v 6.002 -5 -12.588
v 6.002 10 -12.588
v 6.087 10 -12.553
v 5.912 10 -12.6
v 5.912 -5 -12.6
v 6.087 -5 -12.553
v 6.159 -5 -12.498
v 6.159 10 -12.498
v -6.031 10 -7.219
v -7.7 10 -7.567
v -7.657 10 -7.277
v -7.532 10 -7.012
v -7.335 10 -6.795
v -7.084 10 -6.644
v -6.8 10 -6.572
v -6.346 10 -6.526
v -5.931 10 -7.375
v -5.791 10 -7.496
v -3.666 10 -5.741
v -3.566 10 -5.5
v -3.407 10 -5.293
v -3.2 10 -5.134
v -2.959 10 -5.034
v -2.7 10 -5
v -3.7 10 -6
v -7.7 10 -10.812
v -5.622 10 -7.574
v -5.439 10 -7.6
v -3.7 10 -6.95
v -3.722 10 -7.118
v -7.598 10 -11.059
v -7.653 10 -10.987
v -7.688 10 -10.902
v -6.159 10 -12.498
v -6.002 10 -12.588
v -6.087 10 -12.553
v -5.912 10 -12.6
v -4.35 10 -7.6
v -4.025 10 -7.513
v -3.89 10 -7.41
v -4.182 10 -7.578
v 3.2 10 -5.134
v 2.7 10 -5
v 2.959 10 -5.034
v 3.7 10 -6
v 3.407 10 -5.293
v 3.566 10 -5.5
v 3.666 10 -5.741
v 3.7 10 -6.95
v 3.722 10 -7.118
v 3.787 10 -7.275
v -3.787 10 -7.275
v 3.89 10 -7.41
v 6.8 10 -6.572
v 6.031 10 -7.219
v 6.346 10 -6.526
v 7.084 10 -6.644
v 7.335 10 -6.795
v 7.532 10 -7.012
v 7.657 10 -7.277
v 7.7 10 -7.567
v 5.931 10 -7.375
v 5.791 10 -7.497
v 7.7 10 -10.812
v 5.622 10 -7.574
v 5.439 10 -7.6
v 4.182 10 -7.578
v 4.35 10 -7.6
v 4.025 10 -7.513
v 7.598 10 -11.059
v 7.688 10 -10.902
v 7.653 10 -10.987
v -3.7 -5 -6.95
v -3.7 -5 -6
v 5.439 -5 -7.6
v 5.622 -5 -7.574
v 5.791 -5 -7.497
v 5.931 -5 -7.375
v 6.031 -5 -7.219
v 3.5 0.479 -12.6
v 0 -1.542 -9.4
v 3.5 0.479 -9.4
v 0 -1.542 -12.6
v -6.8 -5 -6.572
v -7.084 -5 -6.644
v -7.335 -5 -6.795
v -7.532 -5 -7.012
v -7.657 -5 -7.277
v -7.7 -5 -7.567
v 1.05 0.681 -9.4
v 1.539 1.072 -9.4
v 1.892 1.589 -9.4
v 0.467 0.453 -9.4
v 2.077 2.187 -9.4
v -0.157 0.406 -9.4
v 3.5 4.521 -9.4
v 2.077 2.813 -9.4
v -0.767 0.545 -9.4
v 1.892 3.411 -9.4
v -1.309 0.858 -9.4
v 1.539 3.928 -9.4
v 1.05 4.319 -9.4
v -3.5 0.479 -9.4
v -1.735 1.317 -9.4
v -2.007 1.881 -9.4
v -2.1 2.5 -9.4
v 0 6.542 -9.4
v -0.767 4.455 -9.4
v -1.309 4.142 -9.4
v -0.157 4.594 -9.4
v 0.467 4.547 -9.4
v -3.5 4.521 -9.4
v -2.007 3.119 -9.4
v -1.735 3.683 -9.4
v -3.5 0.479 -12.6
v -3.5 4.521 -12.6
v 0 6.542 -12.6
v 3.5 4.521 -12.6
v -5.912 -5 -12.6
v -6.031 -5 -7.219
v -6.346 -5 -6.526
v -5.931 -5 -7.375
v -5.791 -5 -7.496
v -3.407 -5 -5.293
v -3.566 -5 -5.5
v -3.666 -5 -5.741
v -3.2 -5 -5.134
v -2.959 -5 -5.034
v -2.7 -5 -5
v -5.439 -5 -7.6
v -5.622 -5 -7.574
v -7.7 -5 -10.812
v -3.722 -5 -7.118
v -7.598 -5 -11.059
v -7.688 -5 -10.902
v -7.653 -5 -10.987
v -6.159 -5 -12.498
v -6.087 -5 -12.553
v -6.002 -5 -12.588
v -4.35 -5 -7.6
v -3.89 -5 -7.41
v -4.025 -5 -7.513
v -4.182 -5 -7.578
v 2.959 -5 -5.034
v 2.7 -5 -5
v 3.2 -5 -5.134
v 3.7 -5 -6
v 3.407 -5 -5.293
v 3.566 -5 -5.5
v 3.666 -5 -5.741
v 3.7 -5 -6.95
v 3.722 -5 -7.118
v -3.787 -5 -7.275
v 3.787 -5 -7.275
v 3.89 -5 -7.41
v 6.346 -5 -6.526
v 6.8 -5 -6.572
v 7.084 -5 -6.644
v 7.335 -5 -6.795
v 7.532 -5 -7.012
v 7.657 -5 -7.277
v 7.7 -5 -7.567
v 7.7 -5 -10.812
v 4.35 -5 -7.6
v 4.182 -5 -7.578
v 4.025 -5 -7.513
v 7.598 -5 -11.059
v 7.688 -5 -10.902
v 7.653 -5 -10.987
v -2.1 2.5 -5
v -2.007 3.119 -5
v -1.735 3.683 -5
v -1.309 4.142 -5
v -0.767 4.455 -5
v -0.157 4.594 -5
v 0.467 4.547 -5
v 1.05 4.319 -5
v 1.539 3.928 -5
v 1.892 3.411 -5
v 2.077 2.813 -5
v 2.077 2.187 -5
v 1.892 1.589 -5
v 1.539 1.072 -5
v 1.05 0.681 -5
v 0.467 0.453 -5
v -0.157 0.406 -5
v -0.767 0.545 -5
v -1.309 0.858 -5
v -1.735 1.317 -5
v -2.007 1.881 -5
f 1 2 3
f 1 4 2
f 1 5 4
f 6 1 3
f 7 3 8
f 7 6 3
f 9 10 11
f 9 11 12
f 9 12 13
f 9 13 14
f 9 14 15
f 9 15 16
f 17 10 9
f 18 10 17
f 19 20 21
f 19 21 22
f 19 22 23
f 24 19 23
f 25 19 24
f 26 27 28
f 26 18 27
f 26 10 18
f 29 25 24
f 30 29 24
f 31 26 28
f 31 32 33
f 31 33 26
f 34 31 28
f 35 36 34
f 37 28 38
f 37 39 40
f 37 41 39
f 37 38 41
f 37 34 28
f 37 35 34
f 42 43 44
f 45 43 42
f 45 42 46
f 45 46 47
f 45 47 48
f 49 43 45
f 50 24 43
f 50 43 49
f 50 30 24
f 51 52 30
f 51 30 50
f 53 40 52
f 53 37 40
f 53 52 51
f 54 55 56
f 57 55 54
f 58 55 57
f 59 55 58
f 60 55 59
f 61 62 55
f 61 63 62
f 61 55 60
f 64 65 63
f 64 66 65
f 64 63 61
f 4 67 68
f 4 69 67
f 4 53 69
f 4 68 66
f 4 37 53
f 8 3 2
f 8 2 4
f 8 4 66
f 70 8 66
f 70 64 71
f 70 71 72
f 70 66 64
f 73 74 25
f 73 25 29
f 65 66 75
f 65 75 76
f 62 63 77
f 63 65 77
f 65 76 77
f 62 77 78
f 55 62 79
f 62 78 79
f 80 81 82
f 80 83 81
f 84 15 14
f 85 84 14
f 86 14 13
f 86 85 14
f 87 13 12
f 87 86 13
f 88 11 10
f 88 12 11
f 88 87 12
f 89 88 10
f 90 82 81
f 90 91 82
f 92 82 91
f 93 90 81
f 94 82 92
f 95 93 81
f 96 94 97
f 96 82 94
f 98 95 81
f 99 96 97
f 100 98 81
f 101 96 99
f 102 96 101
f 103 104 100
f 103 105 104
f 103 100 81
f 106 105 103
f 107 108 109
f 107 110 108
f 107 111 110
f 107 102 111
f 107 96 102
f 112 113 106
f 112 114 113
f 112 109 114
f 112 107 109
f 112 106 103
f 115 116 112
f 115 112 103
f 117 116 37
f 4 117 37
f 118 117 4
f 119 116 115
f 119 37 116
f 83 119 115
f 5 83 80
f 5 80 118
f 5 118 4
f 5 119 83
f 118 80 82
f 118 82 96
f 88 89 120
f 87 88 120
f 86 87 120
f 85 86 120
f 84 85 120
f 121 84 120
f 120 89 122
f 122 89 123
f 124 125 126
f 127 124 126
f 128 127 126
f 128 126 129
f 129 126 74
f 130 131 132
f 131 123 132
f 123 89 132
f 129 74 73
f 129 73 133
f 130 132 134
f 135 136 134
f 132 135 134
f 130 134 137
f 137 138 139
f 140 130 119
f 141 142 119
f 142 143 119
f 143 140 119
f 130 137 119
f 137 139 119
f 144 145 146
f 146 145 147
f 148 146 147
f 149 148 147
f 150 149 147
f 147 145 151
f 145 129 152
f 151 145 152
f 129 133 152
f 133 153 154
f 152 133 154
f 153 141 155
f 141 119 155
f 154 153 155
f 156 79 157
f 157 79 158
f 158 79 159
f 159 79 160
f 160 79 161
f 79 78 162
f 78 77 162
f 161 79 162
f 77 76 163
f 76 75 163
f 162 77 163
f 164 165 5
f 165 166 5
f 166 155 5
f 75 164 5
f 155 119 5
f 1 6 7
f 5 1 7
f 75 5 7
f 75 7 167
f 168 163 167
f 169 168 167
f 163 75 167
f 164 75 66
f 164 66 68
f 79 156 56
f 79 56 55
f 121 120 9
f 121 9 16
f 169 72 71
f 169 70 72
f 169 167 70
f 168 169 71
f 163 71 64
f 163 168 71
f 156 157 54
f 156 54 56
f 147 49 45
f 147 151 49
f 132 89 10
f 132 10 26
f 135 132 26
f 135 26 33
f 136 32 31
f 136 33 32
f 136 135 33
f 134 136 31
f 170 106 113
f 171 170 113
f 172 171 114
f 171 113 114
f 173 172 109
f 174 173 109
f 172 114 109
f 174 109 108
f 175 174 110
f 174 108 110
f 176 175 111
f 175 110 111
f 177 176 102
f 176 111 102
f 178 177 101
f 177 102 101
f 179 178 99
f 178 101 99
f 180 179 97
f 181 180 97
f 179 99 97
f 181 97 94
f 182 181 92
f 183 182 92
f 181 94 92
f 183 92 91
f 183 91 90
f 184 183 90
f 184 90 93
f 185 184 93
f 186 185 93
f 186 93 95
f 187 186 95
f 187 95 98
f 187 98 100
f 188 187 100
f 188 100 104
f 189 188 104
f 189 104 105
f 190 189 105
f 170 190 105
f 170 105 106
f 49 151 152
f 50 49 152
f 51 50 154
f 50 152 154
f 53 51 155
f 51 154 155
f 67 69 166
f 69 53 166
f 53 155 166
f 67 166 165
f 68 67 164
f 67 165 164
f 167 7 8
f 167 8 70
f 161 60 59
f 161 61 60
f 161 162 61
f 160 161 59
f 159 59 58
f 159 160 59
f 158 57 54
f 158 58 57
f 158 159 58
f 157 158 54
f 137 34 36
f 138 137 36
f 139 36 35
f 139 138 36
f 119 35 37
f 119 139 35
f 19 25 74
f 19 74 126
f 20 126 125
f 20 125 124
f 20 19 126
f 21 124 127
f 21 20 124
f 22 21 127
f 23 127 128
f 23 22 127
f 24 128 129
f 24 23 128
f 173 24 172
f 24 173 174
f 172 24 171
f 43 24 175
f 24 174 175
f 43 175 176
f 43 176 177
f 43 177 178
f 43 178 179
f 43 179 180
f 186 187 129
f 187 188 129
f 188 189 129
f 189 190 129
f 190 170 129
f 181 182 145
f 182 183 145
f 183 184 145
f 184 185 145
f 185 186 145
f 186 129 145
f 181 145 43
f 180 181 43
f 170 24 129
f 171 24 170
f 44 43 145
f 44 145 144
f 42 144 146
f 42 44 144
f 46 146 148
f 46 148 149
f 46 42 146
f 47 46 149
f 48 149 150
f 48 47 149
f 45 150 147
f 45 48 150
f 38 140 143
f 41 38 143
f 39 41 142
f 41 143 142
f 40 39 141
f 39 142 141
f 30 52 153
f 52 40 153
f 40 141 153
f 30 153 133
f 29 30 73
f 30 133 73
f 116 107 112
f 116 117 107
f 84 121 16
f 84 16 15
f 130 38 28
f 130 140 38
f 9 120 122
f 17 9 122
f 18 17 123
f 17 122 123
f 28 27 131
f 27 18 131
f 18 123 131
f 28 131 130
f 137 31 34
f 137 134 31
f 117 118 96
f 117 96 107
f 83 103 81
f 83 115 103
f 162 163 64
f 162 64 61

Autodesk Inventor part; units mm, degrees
ref_plane "XY Plane" through (0, 0, 0) normal (0, 0, 1) x (1, 0, 0)
sketch "Эскиз1" plane through (0, 0, 0) normal (0, 1, 0) x (-1, 0, 0)
  line L0 (5.5, 5) -> (-5.5, 5)
  line L1 (-5.5, 5) -> (-5.5, -5)
  line L2 (-5.5, -5) -> (5.5, -5)
  line L3 (5.5, -5) -> (5.5, 5)
  line L4 (5.5, 5) -> (-5.5, -5) construction
  line L5 (-5.5, 5) -> (5.5, -5) construction
  point P0 (0, 0)
  dimension "d0" = 11
  dimension "d1" = 10
ref_plane "РабПлоскость1" through (0, 2.5, 0) normal (0, 1, 0) x (1, 0, 0)
sketch "Эскиз3" plane through (0, 2.5, 0) normal (0, 1, 0) x (1, 0, 0)
  arc A0 (-5.15, 5) -> (-4.9, 5.25) centre (-5.15, 5.25) ccw projected
  line L0 (-4.9, 5.8) -> (-4.9, 5.25) projected
  line L1 (-4.35, 5.8) -> (-4.9, 5.8) projected
  arc A1 (-4.35, 5.8) -> (-4.1, 6.05) centre (-4.35, 6.05) ccw projected
  line L2 (-4.1, 6.95) -> (-4.1, 6.05) projected
  arc A2 (-4.1, 6.95) -> (-4.35, 7.2) centre (-4.35, 6.95) ccw projected
  line L3 (-5.439, 7.2) -> (-4.35, 7.2) projected
  arc A3 (-5.439, 7.2) -> (-5.6666, 7.0535) centre (-5.439, 6.95) ccw projected
  line L4 (-6.0258, 6.2631) -> (-5.6666, 7.0535) projected
  arc A4 (-6.2783, 6.1178) -> (-6.0258, 6.2631) centre (-6.2534, 6.3666) ccw projected
  line L5 (-7.8749, 6.2775) -> (-6.2783, 6.1178) projected
  arc A5 (-8.1, 6.5262) -> (-7.8749, 6.2775) centre (-7.85, 6.5262) ccw projected
  line L6 (-8.1, 10.8115) -> (-8.1, 6.5262) projected
  arc A6 (-7.8803, 11.3419) -> (-8.1, 10.8115) centre (-7.35, 10.8115) ccw projected
  arc A7 (8.1, 10.8115) -> (7.8803, 11.3419) centre (7.35, 10.8115) ccw projected
  line L7 (8.1, 6.5262) -> (8.1, 10.8115) projected
  arc A8 (7.8749, 6.2775) -> (8.1, 6.5262) centre (7.85, 6.5262) ccw projected
  line L8 (6.2783, 6.1178) -> (7.8749, 6.2775) projected
  arc A9 (6.0258, 6.2631) -> (6.2783, 6.1178) centre (6.2534, 6.3666) ccw projected
  line L9 (5.6666, 7.0535) -> (6.0258, 6.2631) projected
  arc A10 (5.6666, 7.0535) -> (5.439, 7.2) centre (5.439, 6.95) ccw projected
  line L10 (4.35, 7.2) -> (5.439, 7.2) projected
  arc A11 (4.35, 7.2) -> (4.1, 6.95) centre (4.35, 6.95) ccw projected
  line L11 (4.1, 6.05) -> (4.1, 6.95) projected
  arc A12 (4.1, 6.05) -> (4.35, 5.8) centre (4.35, 6.05) ccw projected
  line L12 (4.9, 5.8) -> (4.35, 5.8) projected
  line L13 (4.9, 5.25) -> (4.9, 5.8) projected
  arc A13 (4.9, 5.25) -> (5.15, 5) centre (5.15, 5.25) ccw projected
  line L14 (7.8803, 11.3419) -> (6.4419, 12.7803) projected
  arc A14 (6.4419, 12.7803) -> (5.9115, 13) centre (5.9115, 12.25) ccw projected
  line L15 (5.9115, 13) -> (0.4906, 13) projected
  line L16 (-0.4906, 13) -> (-5.9115, 13) projected
  arc A15 (-5.9115, 13) -> (-6.4419, 12.7803) centre (-5.9115, 12.25) ccw projected
  line L17 (-6.4419, 12.7803) -> (-7.8803, 11.3419) projected
  line L18 (0.4906, 13) -> (-0.4906, 13)
  line L19 (-3.7, 6.05) -> (-3.7, 6.95)
  arc A16 (-3.7, 6.95) -> (-4.35, 7.6) centre (-4.35, 6.95) ccw
  line L20 (-4.35, 7.6) -> (-5.439, 7.6)
  arc A17 (-5.439, 7.6) -> (-6.0308, 7.219) centre (-5.439, 6.95) ccw
  line L21 (-6.0308, 7.219) -> (-6.3455, 6.5265)
  line L22 (-6.3455, 6.5265) -> (-7.7, 6.662)
  line L23 (-7.7, 6.662) -> (-7.7, 10.8115)
  arc A18 (-7.5975, 11.059) -> (-7.7, 10.8115) centre (-7.35, 10.8115) ccw
  line L24 (-7.5975, 11.059) -> (-6.159, 12.4975)
  arc A19 (-5.9115, 12.6) -> (-6.159, 12.4975) centre (-5.9115, 12.25) ccw
  line L25 (-5.9115, 12.6) -> (-0.4906, 12.6)
  line L26 (-0.4906, 12.6) -> (0.4906, 12.6)
  line L27 (0.4906, 12.6) -> (5.9115, 12.6)
  arc A20 (6.159, 12.4975) -> (5.9115, 12.6) centre (5.9115, 12.25) ccw
  line L28 (6.159, 12.4975) -> (7.5975, 11.059)
  arc A21 (7.7, 10.8115) -> (7.5975, 11.059) centre (7.35, 10.8115) ccw
  line L29 (7.7, 10.8115) -> (7.7, 6.662)
  line L30 (7.7, 6.662) -> (6.3455, 6.5265)
  line L31 (6.3455, 6.5265) -> (6.0308, 7.219)
  arc A22 (6.0308, 7.219) -> (5.439, 7.6) centre (5.439, 6.95) ccw
  line L32 (5.439, 7.6) -> (4.35, 7.6)
  arc A23 (4.35, 7.6) -> (3.7, 6.95) centre (4.35, 6.95) ccw
  line L33 (3.7, 6.95) -> (3.7, 6.1534)
  line L34 (-3.7, 5) -> (3.7, 5)
  line L35 (3.7, 5) -> (3.7, 6.1534)
  line L36 (-3.7, 6.05) -> (-3.7, 5)
  point P0 (0, 0)
  point P1 (-4.9967, 19.8192)
  dimension "d6" = 0.4
  dimension "d11" = 1.95
extrude "Выдавливание3" add sketch "Эскиз3" along normal mid plane 15
sketch "Эскиз4" plane through (5.9115, 10, -12.6) normal (0, 0, -1) x (-1, 0, 0)
  line L0 (2.4115, -5.4793) -> (5.9115, -3.4585)
  line L1 (5.9115, -3.4585) -> (9.4115, -5.4793)
  line L2 (9.4115, -5.4793) -> (9.4115, -9.5207)
  line L3 (9.4115, -9.5207) -> (5.9115, -11.5415)
  line L4 (5.9115, -11.5415) -> (2.4115, -9.5207)
  line L5 (2.4115, -9.5207) -> (2.4115, -5.4793)
  line L6 (11.823, -15) -> (0, -15) projected
  line L7 (-4.8685, -7.5) -> (16.6915, -7.5) construction
  line L8 (5.9115, -18) -> (5.9115, 3) construction
  point P0 (5.9115, -10)
  point P1 (5.9115, -7.5)
  dimension "d13" = 7
extrude "Выдавливание4" cut sketch "Эскиз4" against normal blind 3.2
sketch "Эскиз5" plane through (5.9115, 10, -9.4) normal (0, 0, -1) x (-1, 0, 0)
  circle A0 centre (5.9115, -7.5) radius 2.1
  line L0 (-4.8685, -7.5) -> (16.6915, -7.5) construction
  line L1 (5.9115, -18) -> (5.9115, 3) construction
  point P0 (5.9115, -10)
  dimension "d16" = 4.2
extrude "Выдавливание5" cut sketch "Эскиз5" against normal up to next
fillet "Сопряжение2" radius 1 4 edges at (-3.7, 2.5, -5) (3.7, 2.5, -5) (-7.7, 2.5, -6.662) (7.7, 2.5, -6.662)
properties part number "буль"
